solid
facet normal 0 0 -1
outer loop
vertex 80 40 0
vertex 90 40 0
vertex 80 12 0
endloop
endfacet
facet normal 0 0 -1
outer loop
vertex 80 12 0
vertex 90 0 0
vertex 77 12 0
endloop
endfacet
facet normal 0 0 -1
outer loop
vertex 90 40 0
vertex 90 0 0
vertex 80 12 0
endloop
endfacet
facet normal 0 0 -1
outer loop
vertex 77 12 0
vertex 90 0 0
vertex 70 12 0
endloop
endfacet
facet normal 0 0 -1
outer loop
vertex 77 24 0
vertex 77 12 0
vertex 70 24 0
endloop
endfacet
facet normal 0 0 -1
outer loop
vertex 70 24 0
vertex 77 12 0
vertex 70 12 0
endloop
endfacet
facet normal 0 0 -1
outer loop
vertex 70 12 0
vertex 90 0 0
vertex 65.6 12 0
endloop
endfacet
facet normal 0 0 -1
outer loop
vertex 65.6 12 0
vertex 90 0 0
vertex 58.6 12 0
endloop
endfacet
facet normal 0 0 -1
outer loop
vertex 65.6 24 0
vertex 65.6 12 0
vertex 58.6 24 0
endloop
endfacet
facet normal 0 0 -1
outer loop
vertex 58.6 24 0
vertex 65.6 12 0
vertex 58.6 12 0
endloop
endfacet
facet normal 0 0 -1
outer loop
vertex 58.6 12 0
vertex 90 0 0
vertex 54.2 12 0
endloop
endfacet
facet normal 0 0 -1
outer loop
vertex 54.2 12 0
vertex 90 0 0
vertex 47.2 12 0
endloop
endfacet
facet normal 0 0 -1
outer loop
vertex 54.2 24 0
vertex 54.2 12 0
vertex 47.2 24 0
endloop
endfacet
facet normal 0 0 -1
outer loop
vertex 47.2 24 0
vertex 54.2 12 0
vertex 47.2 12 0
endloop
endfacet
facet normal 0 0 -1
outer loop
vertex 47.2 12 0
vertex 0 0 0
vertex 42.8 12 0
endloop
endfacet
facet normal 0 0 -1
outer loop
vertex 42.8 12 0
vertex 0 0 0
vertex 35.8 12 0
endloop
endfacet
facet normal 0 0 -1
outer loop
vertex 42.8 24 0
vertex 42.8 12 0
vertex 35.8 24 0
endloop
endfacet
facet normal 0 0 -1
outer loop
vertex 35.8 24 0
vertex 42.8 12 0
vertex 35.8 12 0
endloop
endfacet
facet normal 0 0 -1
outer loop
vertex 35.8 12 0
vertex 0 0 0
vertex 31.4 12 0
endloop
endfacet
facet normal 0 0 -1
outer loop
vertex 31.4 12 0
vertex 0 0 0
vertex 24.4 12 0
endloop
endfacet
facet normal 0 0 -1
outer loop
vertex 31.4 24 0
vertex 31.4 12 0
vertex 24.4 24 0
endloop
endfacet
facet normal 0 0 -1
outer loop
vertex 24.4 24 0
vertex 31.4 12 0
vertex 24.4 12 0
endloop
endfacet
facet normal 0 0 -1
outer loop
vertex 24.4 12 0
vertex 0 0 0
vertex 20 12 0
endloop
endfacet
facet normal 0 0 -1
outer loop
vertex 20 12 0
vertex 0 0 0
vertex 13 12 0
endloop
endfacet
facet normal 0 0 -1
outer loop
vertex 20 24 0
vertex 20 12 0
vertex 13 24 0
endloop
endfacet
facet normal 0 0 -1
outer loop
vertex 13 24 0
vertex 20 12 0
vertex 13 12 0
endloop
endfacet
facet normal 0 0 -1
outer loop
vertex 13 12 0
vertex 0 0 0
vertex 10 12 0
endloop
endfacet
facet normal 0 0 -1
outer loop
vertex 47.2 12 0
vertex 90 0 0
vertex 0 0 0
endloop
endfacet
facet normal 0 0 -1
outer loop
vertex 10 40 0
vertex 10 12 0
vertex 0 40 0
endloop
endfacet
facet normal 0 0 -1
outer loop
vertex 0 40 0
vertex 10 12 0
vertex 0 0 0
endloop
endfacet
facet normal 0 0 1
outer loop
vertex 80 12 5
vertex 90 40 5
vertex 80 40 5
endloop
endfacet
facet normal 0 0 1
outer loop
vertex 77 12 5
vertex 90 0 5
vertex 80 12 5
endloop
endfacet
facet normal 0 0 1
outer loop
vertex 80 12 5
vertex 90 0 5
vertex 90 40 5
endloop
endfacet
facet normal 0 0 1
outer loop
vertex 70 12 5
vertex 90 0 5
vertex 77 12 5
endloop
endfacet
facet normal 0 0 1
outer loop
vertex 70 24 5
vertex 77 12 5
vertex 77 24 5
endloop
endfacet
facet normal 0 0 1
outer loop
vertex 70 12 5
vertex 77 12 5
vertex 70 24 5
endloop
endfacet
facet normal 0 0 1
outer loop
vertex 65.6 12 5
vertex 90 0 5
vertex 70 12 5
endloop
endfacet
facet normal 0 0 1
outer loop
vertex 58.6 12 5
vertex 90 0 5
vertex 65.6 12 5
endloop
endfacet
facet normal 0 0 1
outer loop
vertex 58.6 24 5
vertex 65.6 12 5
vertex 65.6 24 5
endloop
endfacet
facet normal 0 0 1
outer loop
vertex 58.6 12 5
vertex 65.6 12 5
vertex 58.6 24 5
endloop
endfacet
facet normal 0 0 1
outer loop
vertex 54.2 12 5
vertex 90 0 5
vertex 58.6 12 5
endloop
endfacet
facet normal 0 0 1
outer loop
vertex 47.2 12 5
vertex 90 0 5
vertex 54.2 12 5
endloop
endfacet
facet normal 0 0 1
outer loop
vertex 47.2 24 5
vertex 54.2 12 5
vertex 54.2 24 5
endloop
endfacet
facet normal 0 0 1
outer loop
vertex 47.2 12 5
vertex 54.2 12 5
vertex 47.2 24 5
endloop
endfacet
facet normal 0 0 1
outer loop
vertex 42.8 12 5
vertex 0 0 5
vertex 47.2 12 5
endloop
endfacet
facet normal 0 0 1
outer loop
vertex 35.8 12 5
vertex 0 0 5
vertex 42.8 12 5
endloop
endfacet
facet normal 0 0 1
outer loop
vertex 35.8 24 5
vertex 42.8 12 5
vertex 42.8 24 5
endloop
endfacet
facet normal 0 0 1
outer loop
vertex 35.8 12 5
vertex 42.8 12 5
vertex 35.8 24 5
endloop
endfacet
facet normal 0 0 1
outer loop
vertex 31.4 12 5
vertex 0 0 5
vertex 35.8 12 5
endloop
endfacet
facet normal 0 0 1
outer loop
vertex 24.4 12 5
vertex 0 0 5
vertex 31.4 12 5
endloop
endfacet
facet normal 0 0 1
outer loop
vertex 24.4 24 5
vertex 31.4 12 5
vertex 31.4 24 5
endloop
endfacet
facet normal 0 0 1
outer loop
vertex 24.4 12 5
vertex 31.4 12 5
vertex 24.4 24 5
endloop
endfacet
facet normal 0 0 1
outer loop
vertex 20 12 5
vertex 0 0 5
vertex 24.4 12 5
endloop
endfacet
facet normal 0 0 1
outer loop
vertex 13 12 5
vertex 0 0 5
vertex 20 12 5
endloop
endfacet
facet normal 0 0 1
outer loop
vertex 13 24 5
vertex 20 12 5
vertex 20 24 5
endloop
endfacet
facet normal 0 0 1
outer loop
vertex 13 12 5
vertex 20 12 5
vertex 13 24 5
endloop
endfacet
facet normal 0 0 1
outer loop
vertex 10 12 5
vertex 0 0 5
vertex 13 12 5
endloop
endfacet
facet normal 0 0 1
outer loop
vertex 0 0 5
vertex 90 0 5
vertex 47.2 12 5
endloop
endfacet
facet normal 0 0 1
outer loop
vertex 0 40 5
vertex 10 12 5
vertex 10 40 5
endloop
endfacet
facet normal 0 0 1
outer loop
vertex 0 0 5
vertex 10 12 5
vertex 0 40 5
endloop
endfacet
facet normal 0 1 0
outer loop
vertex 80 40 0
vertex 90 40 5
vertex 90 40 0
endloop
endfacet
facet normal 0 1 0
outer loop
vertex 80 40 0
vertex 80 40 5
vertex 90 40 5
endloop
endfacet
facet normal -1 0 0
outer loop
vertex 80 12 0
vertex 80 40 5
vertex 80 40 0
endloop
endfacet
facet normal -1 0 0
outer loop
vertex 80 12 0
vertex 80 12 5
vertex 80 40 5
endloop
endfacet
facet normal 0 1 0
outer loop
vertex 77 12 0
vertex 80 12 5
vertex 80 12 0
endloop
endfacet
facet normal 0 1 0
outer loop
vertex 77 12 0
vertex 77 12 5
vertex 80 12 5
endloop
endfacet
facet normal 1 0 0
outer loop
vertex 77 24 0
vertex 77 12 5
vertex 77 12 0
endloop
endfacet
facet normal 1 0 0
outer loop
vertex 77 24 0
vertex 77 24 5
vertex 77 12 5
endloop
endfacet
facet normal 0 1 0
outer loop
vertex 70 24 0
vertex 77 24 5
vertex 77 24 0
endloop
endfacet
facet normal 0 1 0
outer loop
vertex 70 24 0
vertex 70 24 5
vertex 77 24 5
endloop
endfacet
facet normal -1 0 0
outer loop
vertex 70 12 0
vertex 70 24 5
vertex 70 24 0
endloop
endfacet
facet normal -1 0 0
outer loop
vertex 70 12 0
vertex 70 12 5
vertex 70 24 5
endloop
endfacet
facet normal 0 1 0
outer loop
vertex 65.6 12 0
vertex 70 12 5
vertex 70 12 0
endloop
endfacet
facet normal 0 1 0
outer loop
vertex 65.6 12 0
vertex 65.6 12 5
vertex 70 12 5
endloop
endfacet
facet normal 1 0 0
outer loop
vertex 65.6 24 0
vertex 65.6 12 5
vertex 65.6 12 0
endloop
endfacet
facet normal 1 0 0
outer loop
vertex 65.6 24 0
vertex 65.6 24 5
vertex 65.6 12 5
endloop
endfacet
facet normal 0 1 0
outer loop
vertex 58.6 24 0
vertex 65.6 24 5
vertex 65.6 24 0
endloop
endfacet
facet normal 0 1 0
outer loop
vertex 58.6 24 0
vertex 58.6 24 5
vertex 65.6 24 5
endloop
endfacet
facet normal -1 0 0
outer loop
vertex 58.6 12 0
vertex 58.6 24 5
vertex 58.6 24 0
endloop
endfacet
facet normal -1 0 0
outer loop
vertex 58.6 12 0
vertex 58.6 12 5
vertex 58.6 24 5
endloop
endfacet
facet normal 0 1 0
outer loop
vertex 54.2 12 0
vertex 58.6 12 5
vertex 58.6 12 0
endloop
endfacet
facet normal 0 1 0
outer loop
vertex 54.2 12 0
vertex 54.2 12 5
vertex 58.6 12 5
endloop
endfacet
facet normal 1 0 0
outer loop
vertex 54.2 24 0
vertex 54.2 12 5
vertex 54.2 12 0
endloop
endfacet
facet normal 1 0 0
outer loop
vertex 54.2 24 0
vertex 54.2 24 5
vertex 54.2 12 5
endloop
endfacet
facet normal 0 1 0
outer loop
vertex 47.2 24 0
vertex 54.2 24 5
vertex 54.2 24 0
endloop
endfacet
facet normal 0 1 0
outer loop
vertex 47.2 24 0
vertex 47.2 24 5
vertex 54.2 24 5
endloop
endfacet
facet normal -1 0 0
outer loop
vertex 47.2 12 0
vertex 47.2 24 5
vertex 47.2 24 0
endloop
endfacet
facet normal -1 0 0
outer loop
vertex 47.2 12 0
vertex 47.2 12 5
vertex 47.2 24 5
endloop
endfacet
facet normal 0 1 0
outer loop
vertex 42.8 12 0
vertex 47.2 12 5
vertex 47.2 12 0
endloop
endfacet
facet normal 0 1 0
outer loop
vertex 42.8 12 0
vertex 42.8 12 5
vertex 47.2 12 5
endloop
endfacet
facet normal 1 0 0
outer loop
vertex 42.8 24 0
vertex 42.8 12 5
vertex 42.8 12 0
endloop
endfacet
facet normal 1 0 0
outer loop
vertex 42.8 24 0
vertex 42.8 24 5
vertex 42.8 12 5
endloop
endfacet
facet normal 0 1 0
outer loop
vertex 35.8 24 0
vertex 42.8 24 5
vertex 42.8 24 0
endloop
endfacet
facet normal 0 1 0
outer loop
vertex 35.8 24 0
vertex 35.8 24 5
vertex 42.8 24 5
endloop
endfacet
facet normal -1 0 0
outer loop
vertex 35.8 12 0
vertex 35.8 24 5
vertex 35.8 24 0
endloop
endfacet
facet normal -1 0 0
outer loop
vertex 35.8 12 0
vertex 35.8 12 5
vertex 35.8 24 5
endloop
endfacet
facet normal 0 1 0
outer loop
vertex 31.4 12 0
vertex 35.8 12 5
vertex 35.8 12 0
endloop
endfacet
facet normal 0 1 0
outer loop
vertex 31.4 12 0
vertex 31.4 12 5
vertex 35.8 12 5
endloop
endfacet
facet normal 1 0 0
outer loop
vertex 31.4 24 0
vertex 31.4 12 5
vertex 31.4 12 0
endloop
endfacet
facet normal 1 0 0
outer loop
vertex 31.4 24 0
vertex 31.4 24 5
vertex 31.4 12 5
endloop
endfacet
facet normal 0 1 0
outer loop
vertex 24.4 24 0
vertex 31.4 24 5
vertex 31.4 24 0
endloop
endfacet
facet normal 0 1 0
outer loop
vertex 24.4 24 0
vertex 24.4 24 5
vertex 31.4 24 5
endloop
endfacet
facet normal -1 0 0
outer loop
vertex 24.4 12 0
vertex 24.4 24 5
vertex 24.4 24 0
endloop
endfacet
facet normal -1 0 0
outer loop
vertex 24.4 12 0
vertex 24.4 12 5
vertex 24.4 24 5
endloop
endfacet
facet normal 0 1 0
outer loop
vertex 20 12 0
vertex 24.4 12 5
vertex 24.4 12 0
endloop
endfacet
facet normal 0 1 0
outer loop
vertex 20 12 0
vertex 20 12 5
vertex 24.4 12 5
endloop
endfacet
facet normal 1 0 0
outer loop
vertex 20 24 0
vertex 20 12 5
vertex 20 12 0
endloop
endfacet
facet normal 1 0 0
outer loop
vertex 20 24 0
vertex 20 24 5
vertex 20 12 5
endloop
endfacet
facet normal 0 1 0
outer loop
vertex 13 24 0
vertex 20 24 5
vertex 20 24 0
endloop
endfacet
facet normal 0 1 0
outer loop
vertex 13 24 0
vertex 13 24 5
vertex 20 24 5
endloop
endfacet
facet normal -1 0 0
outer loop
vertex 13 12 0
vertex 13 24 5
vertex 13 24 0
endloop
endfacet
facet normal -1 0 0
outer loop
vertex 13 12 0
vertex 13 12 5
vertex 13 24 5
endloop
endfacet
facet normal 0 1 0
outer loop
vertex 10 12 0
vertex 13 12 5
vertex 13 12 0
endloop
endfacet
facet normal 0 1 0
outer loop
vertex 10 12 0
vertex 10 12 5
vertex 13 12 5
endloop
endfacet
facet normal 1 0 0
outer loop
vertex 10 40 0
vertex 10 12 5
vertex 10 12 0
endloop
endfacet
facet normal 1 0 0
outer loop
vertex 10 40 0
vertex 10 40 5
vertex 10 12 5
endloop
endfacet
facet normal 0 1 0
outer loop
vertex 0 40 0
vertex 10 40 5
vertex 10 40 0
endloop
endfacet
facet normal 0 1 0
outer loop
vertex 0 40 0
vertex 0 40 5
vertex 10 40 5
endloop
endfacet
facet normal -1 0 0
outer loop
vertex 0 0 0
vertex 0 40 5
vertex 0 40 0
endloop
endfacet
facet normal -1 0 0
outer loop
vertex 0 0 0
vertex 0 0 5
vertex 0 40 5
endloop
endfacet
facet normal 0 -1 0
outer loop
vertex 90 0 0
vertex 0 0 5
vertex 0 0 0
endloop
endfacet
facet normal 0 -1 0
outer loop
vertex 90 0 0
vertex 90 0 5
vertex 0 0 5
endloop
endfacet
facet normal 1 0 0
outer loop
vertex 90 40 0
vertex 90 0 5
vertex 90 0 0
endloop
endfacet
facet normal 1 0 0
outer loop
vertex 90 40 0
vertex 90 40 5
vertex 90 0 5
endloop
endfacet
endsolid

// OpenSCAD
$fn = 32;

// ----------------------------------------------------------------------
// Guard grille: 6 slats over a 90 x 40 mm plate
// ----------------------------------------------------------------------

// --- parameters (mm) ---
profile_height = 5;       // extrusion height
profile_points = 32;      // points of the closed outline

profile = [[0, 0], [90, 0], [90, 40], [80, 40], [80, 12], [77, 12], [77, 24], [70, 24], [70, 12], [65.6, 12], [65.6, 24], [58.6, 24], [58.6, 12], [54.2, 12], [54.2, 24], [47.2, 24], [47.2, 12], [42.8, 12], [42.8, 24], [35.8, 24], [35.8, 12], [31.4, 12], [31.4, 24], [24.4, 24], [24.4, 12], [20, 12], [20, 24], [13, 24], [13, 12], [10, 12], [10, 40], [0, 40]];  // single closed polygon, 32 points, counter clockwise

// --- the one profile operation ---
linear_extrude(height = profile_height) polygon(points = profile);
